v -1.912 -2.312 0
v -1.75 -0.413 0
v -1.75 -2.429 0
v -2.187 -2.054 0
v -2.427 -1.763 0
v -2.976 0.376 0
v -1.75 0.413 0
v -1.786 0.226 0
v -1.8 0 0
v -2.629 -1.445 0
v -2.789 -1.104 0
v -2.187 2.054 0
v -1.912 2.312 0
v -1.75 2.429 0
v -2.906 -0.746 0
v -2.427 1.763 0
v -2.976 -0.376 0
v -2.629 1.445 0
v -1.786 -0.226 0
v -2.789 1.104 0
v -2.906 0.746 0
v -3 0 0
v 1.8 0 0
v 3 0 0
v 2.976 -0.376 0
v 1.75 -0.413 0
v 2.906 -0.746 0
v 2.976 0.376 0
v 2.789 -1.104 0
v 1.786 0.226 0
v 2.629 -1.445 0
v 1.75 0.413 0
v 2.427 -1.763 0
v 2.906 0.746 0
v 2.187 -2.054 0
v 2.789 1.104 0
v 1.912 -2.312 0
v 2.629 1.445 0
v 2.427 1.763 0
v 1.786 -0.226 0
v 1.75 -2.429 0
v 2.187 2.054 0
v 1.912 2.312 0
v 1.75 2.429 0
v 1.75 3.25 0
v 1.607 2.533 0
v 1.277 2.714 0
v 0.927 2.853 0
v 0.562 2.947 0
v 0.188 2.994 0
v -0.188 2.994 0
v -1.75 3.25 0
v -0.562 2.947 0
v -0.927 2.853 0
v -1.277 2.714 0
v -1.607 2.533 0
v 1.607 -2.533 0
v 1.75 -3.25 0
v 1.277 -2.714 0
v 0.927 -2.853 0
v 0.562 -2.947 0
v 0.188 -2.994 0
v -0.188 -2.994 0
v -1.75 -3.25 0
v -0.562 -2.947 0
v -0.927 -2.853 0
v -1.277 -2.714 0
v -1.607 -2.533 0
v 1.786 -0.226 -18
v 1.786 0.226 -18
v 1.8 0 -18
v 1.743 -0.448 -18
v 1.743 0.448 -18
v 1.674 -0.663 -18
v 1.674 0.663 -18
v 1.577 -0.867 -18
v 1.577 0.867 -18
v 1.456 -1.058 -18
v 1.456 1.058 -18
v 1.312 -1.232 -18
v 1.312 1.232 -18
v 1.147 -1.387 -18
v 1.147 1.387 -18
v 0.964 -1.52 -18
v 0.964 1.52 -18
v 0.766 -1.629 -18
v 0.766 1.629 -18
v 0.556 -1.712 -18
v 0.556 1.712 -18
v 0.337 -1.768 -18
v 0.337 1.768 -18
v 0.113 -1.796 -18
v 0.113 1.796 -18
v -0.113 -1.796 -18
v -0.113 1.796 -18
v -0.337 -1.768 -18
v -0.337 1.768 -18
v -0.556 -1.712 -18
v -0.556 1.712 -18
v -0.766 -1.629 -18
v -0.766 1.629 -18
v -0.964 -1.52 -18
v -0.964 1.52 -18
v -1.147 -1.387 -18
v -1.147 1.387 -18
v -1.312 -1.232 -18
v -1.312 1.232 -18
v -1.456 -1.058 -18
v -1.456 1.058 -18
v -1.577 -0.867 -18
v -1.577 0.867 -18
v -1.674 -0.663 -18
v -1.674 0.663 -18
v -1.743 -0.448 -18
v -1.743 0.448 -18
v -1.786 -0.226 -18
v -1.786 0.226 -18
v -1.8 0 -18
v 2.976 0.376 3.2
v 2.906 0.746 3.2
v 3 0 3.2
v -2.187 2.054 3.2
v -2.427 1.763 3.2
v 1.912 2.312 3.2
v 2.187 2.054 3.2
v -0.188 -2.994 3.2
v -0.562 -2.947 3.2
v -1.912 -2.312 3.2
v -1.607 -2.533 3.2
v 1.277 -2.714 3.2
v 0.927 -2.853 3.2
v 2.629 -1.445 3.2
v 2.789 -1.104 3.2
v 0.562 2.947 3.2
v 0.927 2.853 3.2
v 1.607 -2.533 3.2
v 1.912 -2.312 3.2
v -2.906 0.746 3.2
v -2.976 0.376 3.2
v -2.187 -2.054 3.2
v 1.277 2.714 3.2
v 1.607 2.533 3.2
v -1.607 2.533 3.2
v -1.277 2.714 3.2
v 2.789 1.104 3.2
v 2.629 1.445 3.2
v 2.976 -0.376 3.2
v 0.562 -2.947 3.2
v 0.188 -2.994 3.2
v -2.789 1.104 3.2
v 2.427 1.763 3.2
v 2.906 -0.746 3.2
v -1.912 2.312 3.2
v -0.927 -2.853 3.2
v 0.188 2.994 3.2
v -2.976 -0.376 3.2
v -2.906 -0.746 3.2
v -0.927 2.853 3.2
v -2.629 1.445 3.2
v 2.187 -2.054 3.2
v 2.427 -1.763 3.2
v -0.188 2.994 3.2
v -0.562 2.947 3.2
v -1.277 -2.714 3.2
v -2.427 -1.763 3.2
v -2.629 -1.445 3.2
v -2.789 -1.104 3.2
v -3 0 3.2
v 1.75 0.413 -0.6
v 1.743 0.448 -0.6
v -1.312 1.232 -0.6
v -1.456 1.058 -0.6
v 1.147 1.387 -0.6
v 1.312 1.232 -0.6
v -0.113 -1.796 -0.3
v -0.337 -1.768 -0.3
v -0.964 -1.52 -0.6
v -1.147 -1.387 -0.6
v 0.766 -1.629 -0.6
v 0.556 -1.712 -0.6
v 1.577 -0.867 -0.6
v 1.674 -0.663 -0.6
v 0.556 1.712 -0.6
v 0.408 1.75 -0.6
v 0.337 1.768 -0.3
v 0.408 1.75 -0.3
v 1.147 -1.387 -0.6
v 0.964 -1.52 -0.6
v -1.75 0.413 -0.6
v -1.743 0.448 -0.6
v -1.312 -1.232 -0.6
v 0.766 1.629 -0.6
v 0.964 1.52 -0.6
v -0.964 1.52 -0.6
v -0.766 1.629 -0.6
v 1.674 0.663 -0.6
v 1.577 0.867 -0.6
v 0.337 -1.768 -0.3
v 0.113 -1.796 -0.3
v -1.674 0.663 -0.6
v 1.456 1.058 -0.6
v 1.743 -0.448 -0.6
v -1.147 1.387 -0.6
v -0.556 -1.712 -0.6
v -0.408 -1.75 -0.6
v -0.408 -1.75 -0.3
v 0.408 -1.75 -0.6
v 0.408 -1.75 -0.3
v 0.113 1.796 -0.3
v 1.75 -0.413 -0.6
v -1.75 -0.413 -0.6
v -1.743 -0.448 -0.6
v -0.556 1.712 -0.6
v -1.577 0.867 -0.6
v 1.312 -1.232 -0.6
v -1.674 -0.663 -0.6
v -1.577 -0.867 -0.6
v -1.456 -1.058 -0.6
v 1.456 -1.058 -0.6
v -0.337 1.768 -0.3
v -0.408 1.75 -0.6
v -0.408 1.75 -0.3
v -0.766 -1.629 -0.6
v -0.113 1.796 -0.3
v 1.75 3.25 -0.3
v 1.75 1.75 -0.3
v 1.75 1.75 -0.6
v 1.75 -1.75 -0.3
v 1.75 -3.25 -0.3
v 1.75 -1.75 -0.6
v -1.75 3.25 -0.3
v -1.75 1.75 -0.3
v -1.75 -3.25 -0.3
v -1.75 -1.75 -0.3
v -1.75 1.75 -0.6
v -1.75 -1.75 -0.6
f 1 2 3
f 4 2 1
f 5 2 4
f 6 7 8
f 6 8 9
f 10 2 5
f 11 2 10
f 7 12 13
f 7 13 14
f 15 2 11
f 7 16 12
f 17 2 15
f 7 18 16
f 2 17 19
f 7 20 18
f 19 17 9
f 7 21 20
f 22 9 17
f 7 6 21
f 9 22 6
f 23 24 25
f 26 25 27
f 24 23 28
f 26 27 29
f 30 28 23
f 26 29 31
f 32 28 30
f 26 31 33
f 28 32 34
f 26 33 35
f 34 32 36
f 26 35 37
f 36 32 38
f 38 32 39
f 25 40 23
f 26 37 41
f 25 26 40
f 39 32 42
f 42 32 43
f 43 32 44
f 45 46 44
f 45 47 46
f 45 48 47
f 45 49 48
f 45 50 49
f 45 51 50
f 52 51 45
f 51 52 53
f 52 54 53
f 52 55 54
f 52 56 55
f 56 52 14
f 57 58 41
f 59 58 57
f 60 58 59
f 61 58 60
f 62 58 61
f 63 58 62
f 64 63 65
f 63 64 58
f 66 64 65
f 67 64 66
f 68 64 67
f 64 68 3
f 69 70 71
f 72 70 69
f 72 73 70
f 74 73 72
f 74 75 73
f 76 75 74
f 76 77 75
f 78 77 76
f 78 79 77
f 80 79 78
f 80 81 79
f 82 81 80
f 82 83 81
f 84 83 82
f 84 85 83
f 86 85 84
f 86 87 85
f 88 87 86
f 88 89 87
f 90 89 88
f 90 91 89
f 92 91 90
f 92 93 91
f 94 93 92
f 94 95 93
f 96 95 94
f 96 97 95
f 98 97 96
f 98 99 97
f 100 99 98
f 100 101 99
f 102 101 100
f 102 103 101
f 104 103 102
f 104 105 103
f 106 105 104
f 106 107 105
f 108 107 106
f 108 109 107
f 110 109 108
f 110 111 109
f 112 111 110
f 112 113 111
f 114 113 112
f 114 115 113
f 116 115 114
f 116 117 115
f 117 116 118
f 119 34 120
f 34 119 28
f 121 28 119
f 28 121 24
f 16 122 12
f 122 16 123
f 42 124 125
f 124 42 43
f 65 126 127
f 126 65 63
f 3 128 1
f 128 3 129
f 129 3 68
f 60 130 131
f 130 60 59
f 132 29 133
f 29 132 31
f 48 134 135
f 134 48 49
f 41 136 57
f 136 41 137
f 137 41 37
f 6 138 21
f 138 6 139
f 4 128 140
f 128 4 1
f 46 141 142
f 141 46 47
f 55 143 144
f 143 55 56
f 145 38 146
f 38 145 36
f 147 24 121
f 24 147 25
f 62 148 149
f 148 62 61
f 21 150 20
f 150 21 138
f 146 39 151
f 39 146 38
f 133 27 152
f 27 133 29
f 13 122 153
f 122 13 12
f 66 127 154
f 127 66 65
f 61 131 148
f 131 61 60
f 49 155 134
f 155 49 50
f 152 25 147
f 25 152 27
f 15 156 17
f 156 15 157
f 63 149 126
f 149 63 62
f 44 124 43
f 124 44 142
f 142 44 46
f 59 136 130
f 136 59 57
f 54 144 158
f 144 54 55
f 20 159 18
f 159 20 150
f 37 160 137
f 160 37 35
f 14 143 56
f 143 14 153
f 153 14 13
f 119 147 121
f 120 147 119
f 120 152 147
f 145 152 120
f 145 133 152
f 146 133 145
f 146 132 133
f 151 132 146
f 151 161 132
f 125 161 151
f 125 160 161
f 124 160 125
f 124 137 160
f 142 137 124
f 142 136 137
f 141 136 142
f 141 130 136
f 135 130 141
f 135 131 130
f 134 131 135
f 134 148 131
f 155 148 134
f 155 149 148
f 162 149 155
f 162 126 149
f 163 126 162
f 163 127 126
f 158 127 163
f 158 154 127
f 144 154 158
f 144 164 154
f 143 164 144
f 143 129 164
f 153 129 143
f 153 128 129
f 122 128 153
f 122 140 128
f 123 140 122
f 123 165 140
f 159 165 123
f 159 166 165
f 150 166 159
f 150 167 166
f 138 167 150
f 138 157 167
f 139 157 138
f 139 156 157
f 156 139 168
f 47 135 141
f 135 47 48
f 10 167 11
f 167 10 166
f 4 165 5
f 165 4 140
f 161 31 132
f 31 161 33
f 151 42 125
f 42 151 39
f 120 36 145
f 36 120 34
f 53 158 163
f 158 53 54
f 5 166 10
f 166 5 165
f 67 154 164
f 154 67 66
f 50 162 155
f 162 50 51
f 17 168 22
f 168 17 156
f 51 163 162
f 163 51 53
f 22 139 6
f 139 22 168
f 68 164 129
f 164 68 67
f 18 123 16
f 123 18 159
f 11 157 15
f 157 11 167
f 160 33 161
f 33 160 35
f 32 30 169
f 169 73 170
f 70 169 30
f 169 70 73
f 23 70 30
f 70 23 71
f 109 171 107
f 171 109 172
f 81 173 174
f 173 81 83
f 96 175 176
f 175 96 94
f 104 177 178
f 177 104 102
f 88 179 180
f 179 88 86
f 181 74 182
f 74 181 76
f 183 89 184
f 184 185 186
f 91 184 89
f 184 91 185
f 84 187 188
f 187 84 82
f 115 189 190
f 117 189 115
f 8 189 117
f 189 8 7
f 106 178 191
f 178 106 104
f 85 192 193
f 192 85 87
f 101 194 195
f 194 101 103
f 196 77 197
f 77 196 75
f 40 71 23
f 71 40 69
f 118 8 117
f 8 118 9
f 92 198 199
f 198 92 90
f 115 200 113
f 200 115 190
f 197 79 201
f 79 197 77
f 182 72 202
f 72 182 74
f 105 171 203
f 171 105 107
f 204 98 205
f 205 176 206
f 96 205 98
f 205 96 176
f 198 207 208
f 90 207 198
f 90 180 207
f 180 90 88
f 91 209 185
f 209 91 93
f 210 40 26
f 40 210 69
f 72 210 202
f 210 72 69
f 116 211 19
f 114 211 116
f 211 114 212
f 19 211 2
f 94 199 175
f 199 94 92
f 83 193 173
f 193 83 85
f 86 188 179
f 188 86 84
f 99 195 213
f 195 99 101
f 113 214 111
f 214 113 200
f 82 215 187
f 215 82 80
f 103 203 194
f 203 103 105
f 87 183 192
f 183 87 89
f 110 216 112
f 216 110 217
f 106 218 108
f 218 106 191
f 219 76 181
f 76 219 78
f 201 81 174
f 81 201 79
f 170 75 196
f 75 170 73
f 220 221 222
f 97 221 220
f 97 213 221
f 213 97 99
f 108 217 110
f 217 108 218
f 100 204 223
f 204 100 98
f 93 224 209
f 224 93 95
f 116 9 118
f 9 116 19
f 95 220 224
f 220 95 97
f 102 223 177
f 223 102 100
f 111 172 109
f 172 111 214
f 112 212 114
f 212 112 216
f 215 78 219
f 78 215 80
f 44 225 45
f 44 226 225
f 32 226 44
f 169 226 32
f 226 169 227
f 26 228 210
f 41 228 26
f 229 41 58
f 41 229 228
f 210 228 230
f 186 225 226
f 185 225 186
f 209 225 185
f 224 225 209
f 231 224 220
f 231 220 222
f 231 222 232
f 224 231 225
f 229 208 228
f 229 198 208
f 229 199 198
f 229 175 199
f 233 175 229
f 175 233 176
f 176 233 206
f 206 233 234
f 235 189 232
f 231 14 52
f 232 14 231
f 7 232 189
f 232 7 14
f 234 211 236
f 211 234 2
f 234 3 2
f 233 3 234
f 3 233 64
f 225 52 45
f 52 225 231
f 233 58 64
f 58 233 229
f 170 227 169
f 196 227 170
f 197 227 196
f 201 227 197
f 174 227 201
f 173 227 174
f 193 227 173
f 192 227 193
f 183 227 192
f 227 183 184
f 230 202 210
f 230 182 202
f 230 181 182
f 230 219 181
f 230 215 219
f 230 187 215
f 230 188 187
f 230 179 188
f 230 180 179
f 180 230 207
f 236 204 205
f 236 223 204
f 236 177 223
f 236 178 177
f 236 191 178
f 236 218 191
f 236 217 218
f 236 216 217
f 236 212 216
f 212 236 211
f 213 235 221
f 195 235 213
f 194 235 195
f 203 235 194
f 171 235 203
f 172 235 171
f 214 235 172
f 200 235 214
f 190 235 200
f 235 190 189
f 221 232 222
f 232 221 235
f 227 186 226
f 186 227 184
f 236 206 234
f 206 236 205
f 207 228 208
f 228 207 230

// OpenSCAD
$fn = 50;


difference() {
	union() {
		translate(v = [0, 0, 0]) {
			rotate(a = [0, 0, 0]) {
				difference() {
					union() {
						translate(v = [0, 0, -18.0000000000]) {
							cylinder(h = 18, r = 1.5000000000);
						}
						cylinder(h = 3.2000000000, r = 3.0000000000);
						translate(v = [0, 0, -18.0000000000]) {
							cylinder(h = 18, r = 1.8000000000);
						}
						translate(v = [-1.7500000000, -3.2500000000, -0.3000000000]) {
							cube(size = [3.5000000000, 6.5000000000, 0.3000000000]);
						}
						translate(v = [-1.7500000000, -1.7500000000, -0.6000000000]) {
							cube(size = [3.5000000000, 3.5000000000, 0.3000000000]);
						}
						translate(v = [0, 0, -18.0000000000]) {
							cylinder(h = 18, r = 1.5000000000);
						}
					}
					union();
				}
			}
		}
	}
	union();
}
